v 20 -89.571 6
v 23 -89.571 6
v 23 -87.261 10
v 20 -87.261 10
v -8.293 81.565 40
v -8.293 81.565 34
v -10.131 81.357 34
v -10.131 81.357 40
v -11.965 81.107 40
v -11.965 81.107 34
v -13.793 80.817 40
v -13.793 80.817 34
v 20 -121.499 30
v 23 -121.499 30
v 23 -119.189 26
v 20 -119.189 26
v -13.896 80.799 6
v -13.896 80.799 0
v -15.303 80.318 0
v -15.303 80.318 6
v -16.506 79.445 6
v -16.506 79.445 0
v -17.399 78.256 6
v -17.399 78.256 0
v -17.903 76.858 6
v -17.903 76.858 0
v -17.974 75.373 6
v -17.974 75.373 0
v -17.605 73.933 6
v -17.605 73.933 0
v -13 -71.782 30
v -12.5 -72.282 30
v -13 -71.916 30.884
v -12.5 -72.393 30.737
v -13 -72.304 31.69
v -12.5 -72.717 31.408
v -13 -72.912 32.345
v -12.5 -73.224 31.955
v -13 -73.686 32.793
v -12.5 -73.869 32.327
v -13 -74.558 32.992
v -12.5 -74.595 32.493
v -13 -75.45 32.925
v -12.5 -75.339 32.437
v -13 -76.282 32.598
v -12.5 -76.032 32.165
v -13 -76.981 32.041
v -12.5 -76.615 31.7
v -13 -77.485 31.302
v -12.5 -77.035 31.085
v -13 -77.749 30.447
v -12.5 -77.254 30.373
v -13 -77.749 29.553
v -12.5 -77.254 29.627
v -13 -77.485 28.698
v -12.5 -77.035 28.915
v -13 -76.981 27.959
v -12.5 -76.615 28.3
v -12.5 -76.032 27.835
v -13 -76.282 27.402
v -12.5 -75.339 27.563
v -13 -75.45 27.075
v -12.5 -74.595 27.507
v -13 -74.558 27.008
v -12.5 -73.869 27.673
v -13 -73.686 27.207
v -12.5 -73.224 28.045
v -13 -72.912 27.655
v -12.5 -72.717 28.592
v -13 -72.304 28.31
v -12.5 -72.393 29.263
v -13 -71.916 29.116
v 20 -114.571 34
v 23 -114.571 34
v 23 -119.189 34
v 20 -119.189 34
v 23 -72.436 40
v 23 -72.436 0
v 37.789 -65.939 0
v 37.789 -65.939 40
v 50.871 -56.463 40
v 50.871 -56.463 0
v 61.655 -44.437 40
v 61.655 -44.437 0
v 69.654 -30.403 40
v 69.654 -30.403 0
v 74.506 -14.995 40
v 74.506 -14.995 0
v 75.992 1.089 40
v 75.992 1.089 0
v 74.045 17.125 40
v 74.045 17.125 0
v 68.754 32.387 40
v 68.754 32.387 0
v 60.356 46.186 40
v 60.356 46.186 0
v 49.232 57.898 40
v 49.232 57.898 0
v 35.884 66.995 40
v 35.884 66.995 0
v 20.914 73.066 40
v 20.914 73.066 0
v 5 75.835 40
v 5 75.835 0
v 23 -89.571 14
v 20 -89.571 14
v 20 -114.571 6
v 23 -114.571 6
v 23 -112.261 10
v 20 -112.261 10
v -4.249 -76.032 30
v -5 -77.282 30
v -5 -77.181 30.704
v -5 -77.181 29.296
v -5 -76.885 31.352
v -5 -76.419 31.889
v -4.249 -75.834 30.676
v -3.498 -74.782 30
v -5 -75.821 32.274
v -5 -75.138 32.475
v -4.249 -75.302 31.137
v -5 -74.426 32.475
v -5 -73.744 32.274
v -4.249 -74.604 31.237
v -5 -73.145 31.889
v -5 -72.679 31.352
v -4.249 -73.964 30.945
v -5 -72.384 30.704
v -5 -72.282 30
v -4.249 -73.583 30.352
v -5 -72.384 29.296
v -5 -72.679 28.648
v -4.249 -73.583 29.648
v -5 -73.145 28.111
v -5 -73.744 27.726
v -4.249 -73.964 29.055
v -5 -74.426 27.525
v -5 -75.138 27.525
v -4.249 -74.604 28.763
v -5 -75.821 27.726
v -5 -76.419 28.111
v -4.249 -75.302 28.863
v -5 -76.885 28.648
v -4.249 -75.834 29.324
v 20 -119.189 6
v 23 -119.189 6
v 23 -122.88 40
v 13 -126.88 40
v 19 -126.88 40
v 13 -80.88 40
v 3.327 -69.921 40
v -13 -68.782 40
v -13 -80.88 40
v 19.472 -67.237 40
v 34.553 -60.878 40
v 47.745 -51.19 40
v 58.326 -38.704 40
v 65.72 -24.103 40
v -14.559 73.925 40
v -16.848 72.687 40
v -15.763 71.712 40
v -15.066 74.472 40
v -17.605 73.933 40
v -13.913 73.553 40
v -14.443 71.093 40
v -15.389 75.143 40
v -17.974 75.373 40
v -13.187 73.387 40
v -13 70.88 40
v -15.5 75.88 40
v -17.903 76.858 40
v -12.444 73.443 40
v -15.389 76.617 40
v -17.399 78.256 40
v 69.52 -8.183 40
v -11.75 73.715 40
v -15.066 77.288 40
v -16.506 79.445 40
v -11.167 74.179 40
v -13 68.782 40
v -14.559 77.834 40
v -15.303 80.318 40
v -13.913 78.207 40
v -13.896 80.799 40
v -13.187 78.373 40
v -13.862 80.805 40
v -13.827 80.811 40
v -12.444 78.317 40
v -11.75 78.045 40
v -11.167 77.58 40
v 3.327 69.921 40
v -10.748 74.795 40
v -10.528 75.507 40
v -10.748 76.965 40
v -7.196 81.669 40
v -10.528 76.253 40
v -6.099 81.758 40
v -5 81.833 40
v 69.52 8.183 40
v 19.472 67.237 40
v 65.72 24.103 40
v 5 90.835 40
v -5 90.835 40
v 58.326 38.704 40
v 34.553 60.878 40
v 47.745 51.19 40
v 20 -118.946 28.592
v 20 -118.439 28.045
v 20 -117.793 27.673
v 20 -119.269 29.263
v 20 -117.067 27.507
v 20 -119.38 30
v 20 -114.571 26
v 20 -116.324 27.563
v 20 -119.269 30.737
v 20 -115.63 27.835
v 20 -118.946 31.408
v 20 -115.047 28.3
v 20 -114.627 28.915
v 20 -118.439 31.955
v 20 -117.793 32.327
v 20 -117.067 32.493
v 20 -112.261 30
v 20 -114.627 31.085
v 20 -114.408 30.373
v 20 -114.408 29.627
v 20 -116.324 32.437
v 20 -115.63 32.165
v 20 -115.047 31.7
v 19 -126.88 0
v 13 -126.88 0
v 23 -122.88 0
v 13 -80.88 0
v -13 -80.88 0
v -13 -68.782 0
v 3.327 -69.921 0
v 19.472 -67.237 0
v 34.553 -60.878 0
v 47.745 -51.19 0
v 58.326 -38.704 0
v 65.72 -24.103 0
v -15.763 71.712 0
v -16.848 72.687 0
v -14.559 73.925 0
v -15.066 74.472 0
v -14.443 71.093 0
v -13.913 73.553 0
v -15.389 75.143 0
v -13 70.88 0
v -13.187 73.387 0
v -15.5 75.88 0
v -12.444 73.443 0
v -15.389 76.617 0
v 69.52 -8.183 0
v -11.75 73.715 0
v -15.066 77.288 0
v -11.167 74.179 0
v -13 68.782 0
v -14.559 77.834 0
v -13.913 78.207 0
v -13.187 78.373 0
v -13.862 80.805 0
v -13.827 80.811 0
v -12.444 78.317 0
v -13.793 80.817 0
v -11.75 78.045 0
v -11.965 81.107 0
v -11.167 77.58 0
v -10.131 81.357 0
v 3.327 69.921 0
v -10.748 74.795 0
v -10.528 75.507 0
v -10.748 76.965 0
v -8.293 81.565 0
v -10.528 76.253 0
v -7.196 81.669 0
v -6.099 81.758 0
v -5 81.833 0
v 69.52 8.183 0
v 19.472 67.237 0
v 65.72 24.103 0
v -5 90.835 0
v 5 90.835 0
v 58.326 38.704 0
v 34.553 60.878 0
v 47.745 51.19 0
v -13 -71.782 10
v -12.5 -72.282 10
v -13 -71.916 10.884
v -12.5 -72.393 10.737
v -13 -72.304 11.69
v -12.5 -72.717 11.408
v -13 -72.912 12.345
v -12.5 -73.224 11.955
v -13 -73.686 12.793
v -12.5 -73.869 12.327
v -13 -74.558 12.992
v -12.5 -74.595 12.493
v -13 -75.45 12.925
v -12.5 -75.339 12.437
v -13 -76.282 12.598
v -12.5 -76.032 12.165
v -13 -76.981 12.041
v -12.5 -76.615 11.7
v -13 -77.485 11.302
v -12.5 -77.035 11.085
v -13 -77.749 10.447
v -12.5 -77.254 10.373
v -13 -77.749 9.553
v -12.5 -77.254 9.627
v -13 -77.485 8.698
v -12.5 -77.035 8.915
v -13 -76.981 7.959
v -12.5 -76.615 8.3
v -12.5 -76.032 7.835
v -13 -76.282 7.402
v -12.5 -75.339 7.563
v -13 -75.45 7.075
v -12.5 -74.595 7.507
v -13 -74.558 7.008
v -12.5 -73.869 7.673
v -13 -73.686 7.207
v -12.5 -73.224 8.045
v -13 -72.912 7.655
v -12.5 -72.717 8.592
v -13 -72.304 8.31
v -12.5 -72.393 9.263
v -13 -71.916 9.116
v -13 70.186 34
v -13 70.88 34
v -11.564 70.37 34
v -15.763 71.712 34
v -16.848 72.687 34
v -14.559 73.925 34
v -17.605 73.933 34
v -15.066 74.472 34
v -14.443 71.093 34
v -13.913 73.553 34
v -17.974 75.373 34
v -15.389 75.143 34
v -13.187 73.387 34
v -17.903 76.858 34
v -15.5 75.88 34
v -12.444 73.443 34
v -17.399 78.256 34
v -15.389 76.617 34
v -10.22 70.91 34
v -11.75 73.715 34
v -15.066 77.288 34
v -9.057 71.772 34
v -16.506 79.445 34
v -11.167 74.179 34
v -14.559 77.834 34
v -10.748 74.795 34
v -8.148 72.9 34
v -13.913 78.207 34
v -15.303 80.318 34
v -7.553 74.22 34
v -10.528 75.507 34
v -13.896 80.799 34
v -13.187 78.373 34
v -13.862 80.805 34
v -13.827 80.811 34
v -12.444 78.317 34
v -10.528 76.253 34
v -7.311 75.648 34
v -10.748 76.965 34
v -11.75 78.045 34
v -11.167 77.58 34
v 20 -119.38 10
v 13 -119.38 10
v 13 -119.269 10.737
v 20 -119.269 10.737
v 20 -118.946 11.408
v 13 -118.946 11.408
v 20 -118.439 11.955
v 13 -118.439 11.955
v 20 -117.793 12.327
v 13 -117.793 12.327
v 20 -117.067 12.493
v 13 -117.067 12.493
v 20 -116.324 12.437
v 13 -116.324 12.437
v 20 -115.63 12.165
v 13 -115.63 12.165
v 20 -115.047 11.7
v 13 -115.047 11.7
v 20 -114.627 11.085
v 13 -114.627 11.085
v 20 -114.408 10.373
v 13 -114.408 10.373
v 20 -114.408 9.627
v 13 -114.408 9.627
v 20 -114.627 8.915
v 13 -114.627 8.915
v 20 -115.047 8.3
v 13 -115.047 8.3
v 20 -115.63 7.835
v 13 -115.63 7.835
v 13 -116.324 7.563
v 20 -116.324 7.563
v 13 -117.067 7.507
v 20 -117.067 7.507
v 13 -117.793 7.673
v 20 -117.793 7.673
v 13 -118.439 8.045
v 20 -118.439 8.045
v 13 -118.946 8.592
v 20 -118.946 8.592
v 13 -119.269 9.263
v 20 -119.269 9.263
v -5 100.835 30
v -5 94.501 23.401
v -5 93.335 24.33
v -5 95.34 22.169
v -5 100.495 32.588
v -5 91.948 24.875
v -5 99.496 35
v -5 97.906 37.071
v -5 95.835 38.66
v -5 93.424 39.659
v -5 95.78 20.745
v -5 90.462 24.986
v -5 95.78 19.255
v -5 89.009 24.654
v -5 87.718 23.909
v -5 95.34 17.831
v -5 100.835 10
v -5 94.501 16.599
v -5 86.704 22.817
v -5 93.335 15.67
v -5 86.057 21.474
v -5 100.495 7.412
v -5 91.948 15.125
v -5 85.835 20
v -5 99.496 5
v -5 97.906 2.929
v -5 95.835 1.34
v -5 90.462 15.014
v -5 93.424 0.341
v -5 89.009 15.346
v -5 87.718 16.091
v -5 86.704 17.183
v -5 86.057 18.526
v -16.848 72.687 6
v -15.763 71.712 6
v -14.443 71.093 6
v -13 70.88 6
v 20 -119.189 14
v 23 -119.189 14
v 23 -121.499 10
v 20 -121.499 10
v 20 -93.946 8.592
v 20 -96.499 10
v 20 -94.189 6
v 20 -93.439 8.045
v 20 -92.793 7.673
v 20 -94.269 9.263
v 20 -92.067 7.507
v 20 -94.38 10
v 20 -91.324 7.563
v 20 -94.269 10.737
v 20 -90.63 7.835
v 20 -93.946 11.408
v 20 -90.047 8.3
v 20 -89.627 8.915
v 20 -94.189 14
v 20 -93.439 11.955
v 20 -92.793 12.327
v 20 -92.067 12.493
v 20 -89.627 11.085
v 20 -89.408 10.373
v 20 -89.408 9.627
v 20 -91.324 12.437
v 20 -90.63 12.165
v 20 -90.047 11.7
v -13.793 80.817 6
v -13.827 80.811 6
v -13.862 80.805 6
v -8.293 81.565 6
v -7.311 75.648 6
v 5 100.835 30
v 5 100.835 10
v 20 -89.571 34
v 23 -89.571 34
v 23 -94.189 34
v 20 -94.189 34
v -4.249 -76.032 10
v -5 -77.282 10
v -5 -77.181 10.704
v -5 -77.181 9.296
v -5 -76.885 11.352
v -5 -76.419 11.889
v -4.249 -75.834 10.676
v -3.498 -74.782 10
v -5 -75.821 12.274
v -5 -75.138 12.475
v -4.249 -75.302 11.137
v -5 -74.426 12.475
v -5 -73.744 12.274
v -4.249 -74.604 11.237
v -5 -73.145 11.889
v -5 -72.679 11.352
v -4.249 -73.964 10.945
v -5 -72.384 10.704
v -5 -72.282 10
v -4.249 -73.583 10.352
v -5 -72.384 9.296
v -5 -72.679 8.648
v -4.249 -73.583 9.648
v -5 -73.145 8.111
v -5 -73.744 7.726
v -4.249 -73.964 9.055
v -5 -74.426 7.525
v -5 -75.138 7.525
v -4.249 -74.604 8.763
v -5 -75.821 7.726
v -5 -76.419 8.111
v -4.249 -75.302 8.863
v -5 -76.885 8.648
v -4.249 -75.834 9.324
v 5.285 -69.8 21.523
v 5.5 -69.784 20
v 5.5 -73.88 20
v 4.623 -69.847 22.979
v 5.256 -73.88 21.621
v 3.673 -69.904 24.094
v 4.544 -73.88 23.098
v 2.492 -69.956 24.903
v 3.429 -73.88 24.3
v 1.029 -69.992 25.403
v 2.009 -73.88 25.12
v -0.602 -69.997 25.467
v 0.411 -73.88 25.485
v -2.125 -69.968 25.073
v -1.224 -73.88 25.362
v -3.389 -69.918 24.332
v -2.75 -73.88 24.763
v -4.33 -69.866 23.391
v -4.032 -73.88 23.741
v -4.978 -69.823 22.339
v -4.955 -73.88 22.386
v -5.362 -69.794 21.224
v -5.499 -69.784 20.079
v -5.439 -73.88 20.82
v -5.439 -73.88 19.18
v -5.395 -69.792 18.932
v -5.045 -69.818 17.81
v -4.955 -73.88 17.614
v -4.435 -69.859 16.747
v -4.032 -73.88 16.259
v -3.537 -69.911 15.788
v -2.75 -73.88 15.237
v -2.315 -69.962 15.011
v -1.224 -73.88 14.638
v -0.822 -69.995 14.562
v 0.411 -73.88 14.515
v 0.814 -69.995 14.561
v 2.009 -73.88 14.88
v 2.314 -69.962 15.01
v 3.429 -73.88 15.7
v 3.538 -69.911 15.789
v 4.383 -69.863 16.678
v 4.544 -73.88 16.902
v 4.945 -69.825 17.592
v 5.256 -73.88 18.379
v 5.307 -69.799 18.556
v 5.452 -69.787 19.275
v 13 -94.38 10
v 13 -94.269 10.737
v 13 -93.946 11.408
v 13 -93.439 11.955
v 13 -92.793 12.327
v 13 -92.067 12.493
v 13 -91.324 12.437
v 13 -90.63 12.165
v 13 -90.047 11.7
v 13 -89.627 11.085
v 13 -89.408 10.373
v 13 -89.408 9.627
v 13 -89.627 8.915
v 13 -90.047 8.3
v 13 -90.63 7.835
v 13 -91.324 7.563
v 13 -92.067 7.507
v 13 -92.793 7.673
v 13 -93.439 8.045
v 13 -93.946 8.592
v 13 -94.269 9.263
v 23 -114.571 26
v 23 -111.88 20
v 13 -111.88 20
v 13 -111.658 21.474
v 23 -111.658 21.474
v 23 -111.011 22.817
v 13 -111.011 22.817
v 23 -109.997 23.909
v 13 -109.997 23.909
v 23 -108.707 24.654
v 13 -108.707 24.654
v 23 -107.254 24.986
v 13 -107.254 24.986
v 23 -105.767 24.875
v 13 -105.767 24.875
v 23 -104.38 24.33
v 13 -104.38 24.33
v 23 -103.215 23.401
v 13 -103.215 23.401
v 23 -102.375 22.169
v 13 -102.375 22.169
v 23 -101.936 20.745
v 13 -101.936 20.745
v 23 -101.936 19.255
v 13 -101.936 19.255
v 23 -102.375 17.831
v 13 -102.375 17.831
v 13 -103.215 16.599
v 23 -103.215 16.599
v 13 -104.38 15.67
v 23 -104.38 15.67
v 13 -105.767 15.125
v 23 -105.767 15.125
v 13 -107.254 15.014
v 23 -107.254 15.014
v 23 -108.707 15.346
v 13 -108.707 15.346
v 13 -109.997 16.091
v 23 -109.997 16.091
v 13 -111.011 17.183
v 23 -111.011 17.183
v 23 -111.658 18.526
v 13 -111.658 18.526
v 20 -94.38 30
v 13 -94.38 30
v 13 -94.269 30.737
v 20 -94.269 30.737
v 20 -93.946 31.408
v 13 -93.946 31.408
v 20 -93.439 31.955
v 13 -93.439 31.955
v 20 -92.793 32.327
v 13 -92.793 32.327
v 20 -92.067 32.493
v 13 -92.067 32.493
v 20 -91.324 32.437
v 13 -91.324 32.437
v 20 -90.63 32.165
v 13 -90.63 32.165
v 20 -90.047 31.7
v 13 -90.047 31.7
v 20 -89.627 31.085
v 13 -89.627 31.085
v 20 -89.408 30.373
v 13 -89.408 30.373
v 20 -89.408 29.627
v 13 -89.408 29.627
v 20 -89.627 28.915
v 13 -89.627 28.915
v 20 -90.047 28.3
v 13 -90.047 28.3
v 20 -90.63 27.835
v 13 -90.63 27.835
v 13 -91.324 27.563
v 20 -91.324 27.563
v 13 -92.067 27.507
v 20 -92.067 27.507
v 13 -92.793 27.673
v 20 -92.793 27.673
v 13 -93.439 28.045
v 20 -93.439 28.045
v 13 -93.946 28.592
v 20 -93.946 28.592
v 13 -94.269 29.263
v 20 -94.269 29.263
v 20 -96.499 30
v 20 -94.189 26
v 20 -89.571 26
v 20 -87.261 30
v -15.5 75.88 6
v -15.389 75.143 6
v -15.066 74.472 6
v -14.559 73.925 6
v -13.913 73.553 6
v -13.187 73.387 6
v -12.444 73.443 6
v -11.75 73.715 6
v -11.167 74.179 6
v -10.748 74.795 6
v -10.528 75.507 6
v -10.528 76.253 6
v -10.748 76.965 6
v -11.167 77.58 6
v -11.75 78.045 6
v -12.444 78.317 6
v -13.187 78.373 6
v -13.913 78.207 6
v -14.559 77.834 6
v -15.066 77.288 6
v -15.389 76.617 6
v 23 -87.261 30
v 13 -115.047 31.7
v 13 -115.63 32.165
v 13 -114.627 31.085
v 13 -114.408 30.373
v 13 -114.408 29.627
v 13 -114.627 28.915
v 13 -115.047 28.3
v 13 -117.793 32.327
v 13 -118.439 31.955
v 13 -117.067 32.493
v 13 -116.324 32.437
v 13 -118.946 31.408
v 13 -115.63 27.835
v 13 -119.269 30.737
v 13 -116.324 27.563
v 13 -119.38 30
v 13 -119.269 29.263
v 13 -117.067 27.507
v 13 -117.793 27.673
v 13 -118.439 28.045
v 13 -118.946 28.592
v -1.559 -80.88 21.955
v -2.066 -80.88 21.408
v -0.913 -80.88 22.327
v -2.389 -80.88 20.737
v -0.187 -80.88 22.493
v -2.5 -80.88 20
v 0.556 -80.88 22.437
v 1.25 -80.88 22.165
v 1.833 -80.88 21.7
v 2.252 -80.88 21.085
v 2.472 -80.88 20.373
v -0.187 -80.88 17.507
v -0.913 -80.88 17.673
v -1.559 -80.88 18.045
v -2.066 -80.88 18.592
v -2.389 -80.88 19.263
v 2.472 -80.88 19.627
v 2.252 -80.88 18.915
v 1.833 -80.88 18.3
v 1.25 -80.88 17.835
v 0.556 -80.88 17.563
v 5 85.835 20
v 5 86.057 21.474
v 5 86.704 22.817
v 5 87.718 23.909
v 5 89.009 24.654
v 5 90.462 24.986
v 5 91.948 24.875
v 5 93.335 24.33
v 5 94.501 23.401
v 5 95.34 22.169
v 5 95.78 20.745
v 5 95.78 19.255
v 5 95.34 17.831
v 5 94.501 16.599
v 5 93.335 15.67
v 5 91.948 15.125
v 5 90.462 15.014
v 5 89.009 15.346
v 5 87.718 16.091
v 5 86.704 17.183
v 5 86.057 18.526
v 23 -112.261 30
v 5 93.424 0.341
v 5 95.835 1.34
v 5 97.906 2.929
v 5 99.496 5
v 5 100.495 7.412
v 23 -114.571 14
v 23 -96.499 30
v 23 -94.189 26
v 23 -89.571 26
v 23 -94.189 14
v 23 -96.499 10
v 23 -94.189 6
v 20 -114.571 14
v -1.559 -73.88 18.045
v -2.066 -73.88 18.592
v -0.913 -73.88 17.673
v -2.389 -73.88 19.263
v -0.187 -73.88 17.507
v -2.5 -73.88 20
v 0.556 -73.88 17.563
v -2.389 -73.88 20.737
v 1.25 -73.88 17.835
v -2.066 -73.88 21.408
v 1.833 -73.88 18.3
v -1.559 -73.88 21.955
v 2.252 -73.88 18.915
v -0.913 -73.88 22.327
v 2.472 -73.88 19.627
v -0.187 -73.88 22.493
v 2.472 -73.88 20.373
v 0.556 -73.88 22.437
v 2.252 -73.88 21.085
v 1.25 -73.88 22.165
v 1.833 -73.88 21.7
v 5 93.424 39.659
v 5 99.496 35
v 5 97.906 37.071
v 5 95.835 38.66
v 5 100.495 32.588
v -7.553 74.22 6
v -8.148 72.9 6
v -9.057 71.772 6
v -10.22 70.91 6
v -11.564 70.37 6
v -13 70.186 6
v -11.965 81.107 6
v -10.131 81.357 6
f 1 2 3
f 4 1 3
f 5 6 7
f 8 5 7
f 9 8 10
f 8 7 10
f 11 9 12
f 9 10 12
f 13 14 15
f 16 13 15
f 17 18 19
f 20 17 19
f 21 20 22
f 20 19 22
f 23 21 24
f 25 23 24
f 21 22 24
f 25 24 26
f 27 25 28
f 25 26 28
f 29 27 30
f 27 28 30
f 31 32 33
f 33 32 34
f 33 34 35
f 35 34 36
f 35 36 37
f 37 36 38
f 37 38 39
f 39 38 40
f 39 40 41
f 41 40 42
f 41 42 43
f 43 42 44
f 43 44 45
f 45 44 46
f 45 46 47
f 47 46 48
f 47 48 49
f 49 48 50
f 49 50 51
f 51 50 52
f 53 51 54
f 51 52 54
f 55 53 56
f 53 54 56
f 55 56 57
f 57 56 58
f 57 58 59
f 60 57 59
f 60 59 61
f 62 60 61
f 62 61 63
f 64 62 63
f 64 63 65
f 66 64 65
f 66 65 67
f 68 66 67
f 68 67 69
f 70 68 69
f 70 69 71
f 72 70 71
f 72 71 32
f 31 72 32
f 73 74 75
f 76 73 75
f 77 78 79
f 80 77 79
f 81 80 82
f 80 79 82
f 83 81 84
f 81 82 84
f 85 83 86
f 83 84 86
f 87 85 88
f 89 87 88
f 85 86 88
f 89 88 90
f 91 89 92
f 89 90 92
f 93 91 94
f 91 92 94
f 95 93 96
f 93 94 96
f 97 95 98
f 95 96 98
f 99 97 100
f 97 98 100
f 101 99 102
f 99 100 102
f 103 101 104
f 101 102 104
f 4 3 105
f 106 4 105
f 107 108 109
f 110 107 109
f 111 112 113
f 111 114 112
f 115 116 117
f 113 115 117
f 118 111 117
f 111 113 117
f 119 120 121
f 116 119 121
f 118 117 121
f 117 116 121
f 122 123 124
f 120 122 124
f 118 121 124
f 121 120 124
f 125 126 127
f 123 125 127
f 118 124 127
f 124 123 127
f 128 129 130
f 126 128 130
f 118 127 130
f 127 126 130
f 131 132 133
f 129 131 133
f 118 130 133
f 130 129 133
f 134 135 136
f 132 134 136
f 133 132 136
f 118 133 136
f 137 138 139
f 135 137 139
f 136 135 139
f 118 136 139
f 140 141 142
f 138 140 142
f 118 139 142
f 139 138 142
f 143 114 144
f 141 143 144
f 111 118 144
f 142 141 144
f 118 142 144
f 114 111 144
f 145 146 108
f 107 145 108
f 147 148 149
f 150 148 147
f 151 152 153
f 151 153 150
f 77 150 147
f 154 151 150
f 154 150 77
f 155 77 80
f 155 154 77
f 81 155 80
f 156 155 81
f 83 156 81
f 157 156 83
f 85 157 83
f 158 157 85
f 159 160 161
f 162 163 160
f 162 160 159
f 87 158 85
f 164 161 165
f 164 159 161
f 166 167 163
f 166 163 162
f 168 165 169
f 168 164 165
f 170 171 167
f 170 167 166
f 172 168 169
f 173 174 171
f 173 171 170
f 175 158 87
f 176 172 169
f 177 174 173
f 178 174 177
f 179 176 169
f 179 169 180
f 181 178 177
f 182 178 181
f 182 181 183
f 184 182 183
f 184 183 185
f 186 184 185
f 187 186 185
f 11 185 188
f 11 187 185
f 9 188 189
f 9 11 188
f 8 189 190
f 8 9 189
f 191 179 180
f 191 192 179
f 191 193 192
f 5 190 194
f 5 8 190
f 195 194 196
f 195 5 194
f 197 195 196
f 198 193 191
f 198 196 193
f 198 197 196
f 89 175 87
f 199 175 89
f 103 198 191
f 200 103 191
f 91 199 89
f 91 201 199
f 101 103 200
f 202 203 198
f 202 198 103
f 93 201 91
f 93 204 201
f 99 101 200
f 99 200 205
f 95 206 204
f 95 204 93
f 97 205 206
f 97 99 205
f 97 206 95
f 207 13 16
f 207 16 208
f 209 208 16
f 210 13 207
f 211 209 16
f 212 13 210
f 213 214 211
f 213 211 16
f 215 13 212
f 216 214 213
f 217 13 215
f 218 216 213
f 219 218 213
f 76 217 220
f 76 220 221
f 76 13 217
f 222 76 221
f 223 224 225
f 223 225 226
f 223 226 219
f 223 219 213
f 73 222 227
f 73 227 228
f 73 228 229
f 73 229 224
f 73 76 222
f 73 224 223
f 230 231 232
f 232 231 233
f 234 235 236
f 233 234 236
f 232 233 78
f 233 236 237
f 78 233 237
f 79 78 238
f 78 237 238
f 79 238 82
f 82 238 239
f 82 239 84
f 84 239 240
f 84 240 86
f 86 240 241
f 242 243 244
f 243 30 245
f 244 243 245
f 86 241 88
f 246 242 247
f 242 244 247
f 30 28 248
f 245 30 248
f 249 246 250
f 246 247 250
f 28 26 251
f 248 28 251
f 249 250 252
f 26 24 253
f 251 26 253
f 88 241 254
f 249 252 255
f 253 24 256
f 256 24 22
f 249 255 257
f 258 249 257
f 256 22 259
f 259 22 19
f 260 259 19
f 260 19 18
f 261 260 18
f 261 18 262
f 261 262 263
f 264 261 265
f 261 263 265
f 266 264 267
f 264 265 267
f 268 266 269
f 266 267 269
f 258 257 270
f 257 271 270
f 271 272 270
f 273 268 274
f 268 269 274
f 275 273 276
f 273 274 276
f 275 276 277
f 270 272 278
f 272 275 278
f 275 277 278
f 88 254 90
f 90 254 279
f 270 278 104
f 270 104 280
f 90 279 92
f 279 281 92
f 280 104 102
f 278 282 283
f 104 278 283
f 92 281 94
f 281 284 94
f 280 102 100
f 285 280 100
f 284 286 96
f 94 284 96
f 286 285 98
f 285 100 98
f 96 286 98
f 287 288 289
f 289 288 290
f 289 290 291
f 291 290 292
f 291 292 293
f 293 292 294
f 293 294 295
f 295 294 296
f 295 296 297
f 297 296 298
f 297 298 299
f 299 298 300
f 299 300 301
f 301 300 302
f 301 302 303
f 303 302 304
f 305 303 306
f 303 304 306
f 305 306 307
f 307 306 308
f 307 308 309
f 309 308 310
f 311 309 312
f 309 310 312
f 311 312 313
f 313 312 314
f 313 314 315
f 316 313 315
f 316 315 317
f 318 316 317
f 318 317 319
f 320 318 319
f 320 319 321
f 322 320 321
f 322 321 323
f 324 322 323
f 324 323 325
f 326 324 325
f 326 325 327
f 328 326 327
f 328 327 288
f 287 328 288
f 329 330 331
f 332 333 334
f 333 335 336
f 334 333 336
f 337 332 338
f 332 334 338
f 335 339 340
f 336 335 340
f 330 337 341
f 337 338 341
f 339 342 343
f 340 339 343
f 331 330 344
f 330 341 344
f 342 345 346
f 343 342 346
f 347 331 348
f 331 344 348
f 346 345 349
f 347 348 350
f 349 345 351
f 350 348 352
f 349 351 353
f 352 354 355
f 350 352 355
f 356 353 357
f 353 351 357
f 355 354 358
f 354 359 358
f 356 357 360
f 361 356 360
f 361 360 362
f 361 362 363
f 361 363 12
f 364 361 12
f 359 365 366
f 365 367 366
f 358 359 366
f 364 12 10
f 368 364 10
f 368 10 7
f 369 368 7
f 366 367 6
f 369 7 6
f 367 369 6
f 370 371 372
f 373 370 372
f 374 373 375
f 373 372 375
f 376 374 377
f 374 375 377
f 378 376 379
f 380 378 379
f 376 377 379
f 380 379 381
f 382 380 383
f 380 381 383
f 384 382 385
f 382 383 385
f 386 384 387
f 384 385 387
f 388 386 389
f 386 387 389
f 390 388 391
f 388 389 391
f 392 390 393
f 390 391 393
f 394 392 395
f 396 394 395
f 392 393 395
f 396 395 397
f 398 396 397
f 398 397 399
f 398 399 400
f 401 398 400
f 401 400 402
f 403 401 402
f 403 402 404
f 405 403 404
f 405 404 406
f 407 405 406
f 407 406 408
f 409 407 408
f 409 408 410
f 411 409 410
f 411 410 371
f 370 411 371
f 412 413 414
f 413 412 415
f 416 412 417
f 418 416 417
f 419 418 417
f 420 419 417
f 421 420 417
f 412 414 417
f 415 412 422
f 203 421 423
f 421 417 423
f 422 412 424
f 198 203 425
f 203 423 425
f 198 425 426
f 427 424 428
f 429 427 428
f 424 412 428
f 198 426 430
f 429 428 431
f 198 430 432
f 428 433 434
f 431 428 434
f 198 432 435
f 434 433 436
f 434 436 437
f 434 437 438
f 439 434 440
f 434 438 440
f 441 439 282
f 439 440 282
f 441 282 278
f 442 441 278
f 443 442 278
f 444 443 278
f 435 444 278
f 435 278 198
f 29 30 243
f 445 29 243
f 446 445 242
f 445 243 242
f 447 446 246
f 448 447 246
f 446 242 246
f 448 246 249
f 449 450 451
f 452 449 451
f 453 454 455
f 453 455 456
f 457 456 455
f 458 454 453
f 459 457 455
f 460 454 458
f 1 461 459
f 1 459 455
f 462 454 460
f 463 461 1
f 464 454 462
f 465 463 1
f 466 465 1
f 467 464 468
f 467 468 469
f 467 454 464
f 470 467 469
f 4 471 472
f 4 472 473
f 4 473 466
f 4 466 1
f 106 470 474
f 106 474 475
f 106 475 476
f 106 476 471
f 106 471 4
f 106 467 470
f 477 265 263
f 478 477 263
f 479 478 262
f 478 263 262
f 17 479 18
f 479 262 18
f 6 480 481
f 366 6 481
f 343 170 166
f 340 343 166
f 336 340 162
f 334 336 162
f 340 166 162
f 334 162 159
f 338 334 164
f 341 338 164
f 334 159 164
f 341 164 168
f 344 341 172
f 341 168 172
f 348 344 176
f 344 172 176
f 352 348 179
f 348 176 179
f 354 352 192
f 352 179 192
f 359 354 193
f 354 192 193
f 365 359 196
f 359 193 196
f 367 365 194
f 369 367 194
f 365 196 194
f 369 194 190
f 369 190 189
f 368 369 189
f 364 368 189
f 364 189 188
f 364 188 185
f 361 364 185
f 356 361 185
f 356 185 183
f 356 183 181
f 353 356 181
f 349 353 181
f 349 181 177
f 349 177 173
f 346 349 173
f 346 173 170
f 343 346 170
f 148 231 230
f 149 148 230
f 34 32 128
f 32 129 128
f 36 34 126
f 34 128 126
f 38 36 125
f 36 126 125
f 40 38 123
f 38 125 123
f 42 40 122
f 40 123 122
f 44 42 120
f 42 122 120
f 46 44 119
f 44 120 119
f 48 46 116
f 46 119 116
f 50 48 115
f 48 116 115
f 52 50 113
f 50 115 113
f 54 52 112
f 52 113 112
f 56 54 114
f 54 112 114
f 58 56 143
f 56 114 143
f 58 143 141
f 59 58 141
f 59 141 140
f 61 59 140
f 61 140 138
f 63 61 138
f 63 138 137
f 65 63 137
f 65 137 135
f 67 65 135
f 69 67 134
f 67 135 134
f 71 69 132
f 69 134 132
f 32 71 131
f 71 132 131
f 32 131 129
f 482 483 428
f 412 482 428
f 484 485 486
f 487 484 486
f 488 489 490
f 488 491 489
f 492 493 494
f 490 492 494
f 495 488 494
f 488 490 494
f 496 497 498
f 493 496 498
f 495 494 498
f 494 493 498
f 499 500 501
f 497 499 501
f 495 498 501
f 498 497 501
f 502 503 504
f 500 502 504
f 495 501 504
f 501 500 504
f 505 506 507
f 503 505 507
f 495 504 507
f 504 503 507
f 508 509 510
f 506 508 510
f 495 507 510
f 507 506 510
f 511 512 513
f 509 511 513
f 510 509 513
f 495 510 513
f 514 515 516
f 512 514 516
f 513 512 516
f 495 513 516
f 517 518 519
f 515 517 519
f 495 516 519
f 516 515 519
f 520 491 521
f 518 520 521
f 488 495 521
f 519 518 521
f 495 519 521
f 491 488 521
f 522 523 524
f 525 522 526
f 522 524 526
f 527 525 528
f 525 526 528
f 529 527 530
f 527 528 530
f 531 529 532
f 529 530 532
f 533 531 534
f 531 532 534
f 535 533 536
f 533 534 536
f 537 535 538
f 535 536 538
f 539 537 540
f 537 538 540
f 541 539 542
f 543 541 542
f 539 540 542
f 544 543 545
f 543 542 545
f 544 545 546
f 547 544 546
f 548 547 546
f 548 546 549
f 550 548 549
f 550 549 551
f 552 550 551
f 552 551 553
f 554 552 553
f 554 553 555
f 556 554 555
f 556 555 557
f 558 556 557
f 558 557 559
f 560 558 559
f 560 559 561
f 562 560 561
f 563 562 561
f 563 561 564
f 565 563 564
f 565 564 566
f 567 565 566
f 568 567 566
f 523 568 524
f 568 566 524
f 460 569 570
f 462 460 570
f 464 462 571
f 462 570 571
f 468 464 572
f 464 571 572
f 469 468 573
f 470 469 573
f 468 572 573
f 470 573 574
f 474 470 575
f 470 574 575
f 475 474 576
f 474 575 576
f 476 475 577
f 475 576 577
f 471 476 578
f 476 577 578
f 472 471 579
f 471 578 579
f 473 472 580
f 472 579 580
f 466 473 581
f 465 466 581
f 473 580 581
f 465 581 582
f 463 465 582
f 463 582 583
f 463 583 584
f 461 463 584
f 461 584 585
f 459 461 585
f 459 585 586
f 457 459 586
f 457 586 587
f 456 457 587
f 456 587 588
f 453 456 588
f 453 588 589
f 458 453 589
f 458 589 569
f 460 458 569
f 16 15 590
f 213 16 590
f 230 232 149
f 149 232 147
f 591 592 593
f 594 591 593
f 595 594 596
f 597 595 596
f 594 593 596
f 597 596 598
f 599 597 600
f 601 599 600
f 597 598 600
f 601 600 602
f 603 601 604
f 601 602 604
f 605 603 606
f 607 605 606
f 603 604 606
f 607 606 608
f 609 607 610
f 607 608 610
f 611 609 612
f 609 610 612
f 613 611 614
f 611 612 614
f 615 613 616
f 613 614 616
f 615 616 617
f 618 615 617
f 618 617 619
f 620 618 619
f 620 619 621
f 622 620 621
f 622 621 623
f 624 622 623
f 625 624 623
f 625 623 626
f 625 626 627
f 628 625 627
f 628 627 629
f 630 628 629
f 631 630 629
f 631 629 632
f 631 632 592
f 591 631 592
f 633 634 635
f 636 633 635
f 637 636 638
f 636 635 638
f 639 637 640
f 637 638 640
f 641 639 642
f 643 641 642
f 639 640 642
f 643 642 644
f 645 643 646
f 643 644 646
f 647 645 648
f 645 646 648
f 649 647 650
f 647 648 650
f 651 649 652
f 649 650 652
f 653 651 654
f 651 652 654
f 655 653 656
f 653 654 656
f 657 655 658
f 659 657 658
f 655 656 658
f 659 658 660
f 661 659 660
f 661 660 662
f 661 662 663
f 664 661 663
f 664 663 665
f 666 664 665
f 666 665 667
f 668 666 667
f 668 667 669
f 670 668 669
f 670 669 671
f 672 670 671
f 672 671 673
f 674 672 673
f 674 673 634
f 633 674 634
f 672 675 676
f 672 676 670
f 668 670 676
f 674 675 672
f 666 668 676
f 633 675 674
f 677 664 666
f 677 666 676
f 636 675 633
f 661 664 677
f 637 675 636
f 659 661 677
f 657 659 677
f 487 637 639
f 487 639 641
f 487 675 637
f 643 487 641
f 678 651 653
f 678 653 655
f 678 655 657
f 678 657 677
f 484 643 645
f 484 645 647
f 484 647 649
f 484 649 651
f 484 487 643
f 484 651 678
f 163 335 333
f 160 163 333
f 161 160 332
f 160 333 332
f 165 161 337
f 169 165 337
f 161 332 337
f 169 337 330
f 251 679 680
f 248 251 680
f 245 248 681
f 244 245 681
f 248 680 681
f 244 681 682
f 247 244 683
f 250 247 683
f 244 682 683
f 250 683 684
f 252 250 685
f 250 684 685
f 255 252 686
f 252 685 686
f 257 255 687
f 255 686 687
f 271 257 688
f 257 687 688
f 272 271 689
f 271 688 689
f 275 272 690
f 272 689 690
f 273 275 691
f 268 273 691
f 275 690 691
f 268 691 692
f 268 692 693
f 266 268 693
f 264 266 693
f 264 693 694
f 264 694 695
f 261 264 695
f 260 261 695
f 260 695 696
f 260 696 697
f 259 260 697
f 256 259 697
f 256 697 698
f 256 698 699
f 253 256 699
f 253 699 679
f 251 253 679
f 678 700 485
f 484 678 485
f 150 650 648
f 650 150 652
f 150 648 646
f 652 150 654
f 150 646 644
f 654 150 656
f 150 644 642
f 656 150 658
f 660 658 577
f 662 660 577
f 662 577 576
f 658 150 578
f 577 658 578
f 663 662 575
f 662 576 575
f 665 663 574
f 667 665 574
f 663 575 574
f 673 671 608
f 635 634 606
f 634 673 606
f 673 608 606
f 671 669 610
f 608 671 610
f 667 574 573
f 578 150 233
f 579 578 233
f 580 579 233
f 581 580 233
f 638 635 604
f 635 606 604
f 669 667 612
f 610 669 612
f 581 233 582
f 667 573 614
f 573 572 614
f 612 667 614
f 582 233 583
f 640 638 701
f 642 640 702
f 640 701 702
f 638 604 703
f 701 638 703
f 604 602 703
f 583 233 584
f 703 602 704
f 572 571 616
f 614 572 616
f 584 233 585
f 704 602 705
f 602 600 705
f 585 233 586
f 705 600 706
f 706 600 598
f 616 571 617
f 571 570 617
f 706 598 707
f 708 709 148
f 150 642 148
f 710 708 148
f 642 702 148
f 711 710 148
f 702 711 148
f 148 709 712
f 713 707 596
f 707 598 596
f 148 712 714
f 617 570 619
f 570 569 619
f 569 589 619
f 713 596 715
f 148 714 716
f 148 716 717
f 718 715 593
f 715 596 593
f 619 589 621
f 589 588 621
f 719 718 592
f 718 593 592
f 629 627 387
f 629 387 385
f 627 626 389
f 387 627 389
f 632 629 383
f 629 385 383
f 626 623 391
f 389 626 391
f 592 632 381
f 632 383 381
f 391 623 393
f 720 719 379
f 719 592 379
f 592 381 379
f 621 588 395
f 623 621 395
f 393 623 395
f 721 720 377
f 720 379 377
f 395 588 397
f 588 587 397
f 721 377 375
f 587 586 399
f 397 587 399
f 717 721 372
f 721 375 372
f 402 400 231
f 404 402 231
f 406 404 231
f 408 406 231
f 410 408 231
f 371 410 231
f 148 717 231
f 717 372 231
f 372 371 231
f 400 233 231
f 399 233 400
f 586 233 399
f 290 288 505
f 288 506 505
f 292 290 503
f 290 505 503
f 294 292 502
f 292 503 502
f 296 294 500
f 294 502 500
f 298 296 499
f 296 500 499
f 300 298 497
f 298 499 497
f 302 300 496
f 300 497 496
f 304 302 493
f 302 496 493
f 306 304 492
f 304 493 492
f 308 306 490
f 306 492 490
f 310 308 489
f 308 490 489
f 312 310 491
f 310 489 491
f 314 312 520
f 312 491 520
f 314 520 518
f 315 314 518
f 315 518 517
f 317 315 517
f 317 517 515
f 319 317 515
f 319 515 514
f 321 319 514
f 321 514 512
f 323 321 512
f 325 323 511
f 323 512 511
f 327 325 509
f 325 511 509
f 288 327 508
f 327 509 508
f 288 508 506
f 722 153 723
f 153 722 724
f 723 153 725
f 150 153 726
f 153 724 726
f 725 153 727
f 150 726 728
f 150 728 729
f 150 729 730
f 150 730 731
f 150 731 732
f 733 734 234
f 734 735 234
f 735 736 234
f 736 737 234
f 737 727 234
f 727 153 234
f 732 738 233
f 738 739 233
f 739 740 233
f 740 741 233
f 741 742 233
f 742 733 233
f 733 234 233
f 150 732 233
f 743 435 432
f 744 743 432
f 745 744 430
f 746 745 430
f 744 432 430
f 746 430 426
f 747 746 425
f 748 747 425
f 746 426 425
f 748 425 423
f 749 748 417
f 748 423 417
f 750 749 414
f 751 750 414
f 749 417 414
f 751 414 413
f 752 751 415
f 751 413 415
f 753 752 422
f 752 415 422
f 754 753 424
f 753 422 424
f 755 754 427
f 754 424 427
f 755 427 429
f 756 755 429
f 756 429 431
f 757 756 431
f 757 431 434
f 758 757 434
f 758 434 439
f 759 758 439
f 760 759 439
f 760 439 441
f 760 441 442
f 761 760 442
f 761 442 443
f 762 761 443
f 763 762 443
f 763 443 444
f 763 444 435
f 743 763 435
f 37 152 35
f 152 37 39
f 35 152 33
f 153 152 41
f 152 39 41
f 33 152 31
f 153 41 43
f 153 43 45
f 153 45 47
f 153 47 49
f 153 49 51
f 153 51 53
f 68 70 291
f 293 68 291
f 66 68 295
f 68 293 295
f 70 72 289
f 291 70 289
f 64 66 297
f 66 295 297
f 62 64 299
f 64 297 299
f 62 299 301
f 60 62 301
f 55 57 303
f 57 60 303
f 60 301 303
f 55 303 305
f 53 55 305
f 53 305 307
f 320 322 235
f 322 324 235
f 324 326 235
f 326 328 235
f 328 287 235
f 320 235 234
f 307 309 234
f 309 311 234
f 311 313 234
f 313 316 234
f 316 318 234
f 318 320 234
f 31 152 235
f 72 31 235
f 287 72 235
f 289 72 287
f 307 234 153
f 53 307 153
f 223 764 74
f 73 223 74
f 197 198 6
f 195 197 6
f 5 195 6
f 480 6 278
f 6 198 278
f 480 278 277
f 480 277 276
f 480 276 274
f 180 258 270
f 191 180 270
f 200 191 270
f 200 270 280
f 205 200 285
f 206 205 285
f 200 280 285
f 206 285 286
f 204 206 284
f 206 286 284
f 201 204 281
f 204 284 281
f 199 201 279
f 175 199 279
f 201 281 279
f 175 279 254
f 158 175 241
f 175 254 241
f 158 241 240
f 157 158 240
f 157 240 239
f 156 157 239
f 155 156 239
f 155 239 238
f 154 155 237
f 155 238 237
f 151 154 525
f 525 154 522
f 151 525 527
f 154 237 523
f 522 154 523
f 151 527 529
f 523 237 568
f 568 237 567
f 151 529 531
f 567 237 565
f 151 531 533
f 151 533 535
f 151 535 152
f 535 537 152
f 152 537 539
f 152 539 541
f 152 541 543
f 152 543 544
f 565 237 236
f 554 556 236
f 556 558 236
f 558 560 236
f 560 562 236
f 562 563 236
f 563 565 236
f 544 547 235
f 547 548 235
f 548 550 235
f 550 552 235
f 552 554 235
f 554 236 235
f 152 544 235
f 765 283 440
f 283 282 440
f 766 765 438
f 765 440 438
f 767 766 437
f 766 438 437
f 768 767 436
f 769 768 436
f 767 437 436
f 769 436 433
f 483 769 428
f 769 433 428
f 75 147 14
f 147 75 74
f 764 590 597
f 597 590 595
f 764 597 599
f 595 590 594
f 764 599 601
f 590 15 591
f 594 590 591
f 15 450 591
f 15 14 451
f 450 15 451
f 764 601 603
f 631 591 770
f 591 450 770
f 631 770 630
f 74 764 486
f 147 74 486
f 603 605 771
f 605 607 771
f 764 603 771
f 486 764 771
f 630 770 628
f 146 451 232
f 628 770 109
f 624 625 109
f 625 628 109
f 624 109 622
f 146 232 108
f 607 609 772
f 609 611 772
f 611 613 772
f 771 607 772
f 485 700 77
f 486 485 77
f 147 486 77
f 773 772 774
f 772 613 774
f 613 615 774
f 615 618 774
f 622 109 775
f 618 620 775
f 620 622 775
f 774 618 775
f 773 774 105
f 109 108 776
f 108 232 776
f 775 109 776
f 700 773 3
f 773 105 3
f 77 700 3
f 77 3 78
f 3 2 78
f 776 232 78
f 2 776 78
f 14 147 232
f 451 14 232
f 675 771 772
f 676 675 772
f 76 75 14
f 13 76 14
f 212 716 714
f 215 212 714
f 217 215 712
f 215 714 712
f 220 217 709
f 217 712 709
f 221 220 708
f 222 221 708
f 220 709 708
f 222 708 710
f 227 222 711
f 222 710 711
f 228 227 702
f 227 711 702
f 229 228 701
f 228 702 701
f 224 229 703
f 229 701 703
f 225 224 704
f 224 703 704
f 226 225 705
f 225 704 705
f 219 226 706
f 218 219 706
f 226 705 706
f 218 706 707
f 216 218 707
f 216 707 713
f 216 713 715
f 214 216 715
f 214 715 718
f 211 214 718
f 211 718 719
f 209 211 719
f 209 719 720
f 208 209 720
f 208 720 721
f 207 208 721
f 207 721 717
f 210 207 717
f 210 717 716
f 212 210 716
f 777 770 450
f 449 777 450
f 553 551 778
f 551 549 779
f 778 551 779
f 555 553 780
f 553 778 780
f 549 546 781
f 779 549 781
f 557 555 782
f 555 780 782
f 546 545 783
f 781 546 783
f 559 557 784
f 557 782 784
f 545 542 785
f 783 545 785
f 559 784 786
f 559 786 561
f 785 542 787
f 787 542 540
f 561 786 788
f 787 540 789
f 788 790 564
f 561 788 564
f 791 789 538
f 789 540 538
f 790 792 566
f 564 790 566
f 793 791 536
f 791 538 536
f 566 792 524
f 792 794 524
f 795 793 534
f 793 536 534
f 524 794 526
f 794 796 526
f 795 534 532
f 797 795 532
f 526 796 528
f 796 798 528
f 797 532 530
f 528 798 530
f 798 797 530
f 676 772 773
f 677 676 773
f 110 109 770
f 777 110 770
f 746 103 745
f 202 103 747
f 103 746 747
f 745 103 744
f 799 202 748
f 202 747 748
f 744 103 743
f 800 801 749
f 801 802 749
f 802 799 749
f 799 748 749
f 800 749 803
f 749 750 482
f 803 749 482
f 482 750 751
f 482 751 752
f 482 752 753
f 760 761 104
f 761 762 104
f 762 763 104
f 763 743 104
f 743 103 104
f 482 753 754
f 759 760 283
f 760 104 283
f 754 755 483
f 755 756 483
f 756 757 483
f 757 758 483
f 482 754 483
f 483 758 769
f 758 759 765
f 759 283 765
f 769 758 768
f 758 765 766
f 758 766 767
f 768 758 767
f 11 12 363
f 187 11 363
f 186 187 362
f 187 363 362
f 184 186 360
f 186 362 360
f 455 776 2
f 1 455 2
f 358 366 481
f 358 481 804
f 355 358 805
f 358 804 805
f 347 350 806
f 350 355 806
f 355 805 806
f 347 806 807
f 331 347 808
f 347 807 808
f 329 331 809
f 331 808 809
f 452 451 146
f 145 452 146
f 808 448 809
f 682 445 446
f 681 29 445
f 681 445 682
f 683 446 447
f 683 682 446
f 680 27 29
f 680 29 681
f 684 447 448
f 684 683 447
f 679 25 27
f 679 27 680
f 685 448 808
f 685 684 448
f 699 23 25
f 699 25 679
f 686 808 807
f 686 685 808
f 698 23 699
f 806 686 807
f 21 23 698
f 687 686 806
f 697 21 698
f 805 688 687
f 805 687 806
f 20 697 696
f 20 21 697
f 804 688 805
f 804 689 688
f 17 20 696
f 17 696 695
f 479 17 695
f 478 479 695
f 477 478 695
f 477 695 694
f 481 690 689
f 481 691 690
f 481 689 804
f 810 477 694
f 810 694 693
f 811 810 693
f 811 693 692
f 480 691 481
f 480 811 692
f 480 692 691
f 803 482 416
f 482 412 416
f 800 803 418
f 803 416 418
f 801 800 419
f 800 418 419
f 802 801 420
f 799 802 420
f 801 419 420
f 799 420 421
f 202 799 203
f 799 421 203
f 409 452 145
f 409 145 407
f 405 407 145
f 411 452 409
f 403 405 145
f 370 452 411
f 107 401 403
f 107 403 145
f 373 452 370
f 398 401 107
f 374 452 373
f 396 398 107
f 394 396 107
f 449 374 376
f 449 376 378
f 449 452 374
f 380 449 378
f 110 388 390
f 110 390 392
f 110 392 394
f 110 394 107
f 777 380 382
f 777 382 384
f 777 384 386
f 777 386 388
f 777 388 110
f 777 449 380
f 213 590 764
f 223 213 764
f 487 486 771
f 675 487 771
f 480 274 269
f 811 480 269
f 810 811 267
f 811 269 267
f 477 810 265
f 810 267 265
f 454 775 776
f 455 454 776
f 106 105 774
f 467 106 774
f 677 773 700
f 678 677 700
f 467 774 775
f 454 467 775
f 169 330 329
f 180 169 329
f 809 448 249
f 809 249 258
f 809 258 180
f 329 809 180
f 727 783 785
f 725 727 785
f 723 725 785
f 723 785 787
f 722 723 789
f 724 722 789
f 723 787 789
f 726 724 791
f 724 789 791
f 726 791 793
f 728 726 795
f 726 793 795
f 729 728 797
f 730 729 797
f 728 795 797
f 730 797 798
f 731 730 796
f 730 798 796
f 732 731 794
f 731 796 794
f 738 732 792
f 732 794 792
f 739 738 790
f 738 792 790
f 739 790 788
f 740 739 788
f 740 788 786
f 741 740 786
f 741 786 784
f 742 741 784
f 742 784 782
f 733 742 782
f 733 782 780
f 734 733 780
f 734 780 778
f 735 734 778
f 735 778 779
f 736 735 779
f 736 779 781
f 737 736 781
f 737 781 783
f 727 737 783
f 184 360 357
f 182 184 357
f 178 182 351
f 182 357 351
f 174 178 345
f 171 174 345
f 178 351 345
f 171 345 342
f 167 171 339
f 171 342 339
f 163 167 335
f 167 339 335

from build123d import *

# Parameters (mm, degrees)
F1_DEPTH       = 40
F2_START       = 34
F2_DEPTH       = 6
F3_DEPTH       = 6
F5_D           = 5
F5_DEPTH       = 8
F5_CSINK_D     = 6
F5_CSINK_ANGLE = 90
F5_TIP         = 1.5021515476
F7_D           = 10
F8_D           = 5
F9_SIZE        = 4
F11_D          = 10
F12_R          = 10
F13_D          = 5
F15_D          = 5
F15_DEPTH      = 12
F15_TIP        = 1.5021515476
F16_START      = -7
F14_R          = 5.5
F16_DEPTH      = 5
F17_DEPTH      = 3


with BuildPart() as f1:
    # F0 (on Top) → F1 (new body)
    with BuildSketch(Plane.XY):
        with BuildLine():
            Line((-8.2927711273, 81.5647094006), (-7.3107365454, 75.6475586596))
            ThreePointArc((-7.3107365454, 75.6475586596), (-6.1560843706, 75.7502648525), (-5, 75.8353479586))
            Line((-5, 75.8353479586), (-5, 81.8325844183))
            ThreePointArc((-5, 81.8325844183), (-6.6477349765, 81.7152341505), (-8.2927711273, 81.5647094006))
        make_face()
        with BuildLine():
            Line((-5, 81.8325844183), (-5, 75.8353479586))
            ThreePointArc((-5, 75.8353479586), (0, 76), (5, 75.8353479586))
            Line((5, 75.8353479586), (5, 100.8353479586))
            Line((5, 100.8353479586), (-5, 100.8353479586))
            Line((-5, 100.8353479586), (-5, 81.8325844183))
        make_face()
        with BuildLine():
            ThreePointArc((-13, 68.7822651561), (44.6654228683, 53.8980519128), (70, 0))
            ThreePointArc((70, 0), (44.6654228683, -53.8980519128), (-13, -68.7822651561))
            Line((-13, -68.7822651561), (-13, -74.8799038461))
            ThreePointArc((-13, -74.8799038461), (0, -76), (13, -74.8799038461))
            ThreePointArc((13, -74.8799038461), (18.0414231151, -73.8275494107), (23, -72.4361788059))
            ThreePointArc((23, -72.4361788059), (61.3351449008, -44.8776113446), (76, 0))
            ThreePointArc((76, 0), (55.4797260267, 51.9422756529), (5, 75.8353479586))
            ThreePointArc((5, 75.8353479586), (0, 76), (-5, 75.8353479586))
            ThreePointArc((-5, 75.8353479586), (-6.1560843706, 75.7502648525), (-7.3107365454, 75.6475586596))
            ThreePointArc((-7.3107365454, 75.6475586596), (-9.056731807, 71.7723085764), (-13, 70.1858979679))
            Line((-13, 70.1858979679), (-13, 68.7822651561))
        make_face()
        with BuildLine():
            ThreePointArc((13, -74.8799038461), (0, -76), (-13, -74.8799038461))
            Line((-13, -74.8799038461), (-13, -80.8799038461))
            Line((-13, -80.8799038461), (13, -80.8799038461))
            Line((13, -80.8799038461), (13, -74.8799038461))
        make_face()
        with BuildLine():
            ThreePointArc((23, -72.4361788059), (18.0414231151, -73.8275494107), (13, -74.8799038461))
            Line((13, -74.8799038461), (13, -80.8799038461))
            Line((13, -80.8799038461), (13, -126.8799038461))
            Line((13, -126.8799038461), (23, -126.8799038461))
            Line((23, -126.8799038461), (23, -72.4361788059))
        make_face()
    extrude(amount=F1_DEPTH)

    # F0 (on Top) → F2 (join)
    with BuildSketch(Plane.XY.offset(F2_START)):
        with BuildLine():
            ThreePointArc((-8.009195615, 75.576800578), (-7.6600477823, 75.6129861067), (-7.3107365454, 75.6475586596))
            Line((-7.3107365454, 75.6475586596), (-8.2927711273, 81.5647094006))
            ThreePointArc((-8.2927711273, 81.5647094006), (-11.0489742273, 81.2372577153), (-13.7925136268, 80.8166965449))
            ThreePointArc((-13.7925136268, 80.8166965449), (-9.7567430054, 79.6853320831), (-8, 75.8799038461))
            ThreePointArc((-8, 75.8799038461), (-8.0022994325, 75.7282824834), (-8.009195615, 75.576800578))
        make_face()
        with BuildLine():
            Line((-13, 74.8799038461), (-13, 70.8799038461))
            ThreePointArc((-13, 70.8799038461), (-9.5733045321, 72.2387833907), (-8.009195615, 75.576800578))
            ThreePointArc((-8.009195615, 75.576800578), (-10.5103754149, 75.2697283683), (-13, 74.8799038461))
        make_face()
        with BuildLine():
            ThreePointArc((-17.6052855561, 73.9327662169), (-15.7626356848, 71.7124293023), (-13, 70.8799038461))
            Line((-13, 70.8799038461), (-13, 74.8799038461))
            ThreePointArc((-13, 74.8799038461), (-15.3099687594, 74.441956292), (-17.6052855561, 73.9327662169))
        make_face()
        with BuildLine():
            ThreePointArc((-13.8960239837, 80.7989628029), (-17.3991209977, 78.2564001006), (-17.6052855561, 73.9327662169))
            ThreePointArc((-17.6052855561, 73.9327662169), (-15.3099687594, 74.441956292), (-13, 74.8799038461))
            ThreePointArc((-13, 74.8799038461), (-10.5103754149, 75.2697283683), (-8.009195615, 75.576800578))
            ThreePointArc((-8.009195615, 75.576800578), (-8.0022994325, 75.7282824834), (-8, 75.8799038461))
            ThreePointArc((-8, 75.8799038461), (-9.7567430054, 79.6853320831), (-13.7925136268, 80.8166965449))
            ThreePointArc((-13.7925136268, 80.8166965449), (-13.8442716447, 80.8078462478), (-13.8960239837, 80.7989628029))
        make_face()
        with BuildLine():
            Line((-13, 70.8799038461), (-13, 70.1858979679))
            ThreePointArc((-13, 70.1858979679), (-9.056731807, 71.7723085764), (-7.3107365454, 75.6475586596))
            ThreePointArc((-7.3107365454, 75.6475586596), (-7.6600477823, 75.6129861067), (-8.009195615, 75.576800578))
            ThreePointArc((-8.009195615, 75.576800578), (-9.5733045321, 72.2387833907), (-13, 70.8799038461))
        make_face()
    extrude(amount=F2_DEPTH)

    # F0 (on Top) → F3 (join)
    with BuildSketch(Plane.XY):
        with BuildLine():
            ThreePointArc((-8.009195615, 75.576800578), (-7.6600477823, 75.6129861067), (-7.3107365454, 75.6475586596))
            Line((-7.3107365454, 75.6475586596), (-8.2927711273, 81.5647094006))
            ThreePointArc((-8.2927711273, 81.5647094006), (-11.0489742273, 81.2372577153), (-13.7925136268, 80.8166965449))
            ThreePointArc((-13.7925136268, 80.8166965449), (-9.7567430054, 79.6853320831), (-8, 75.8799038461))
            ThreePointArc((-8, 75.8799038461), (-8.0022994325, 75.7282824834), (-8.009195615, 75.576800578))
        make_face()
        with BuildLine():
            Line((-13, 74.8799038461), (-13, 70.8799038461))
            ThreePointArc((-13, 70.8799038461), (-9.5733045321, 72.2387833907), (-8.009195615, 75.576800578))
            ThreePointArc((-8.009195615, 75.576800578), (-10.5103754149, 75.2697283683), (-13, 74.8799038461))
        make_face()
        with BuildLine():
            ThreePointArc((-17.6052855561, 73.9327662169), (-15.7626356848, 71.7124293023), (-13, 70.8799038461))
            Line((-13, 70.8799038461), (-13, 74.8799038461))
            ThreePointArc((-13, 74.8799038461), (-15.3099687594, 74.441956292), (-17.6052855561, 73.9327662169))
        make_face()
        with BuildLine():
            ThreePointArc((-13.8960239837, 80.7989628029), (-17.3991209977, 78.2564001006), (-17.6052855561, 73.9327662169))
            ThreePointArc((-17.6052855561, 73.9327662169), (-15.3099687594, 74.441956292), (-13, 74.8799038461))
            ThreePointArc((-13, 74.8799038461), (-10.5103754149, 75.2697283683), (-8.009195615, 75.576800578))
            ThreePointArc((-8.009195615, 75.576800578), (-8.0022994325, 75.7282824834), (-8, 75.8799038461))
            ThreePointArc((-8, 75.8799038461), (-9.7567430054, 79.6853320831), (-13.7925136268, 80.8166965449))
            ThreePointArc((-13.7925136268, 80.8166965449), (-13.8442716447, 80.8078462478), (-13.8960239837, 80.7989628029))
        make_face()
        with BuildLine():
            Line((-13, 70.8799038461), (-13, 70.1858979679))
            ThreePointArc((-13, 70.1858979679), (-9.056731807, 71.7723085764), (-7.3107365454, 75.6475586596))
            ThreePointArc((-7.3107365454, 75.6475586596), (-7.6600477823, 75.6129861067), (-8.009195615, 75.576800578))
            ThreePointArc((-8.009195615, 75.576800578), (-9.5733045321, 72.2387833907), (-13, 70.8799038461))
        make_face()
    extrude(amount=F3_DEPTH)

    # F5
    with Locations(Plane(origin=(-13, 0, 0), x_dir=(0, -1, 0), z_dir=(-1, 0, 0))):
        with Locations((74.7822651561, 30), (74.7822651561, 10)):
            CounterSinkHole(F5_D / 2, F5_CSINK_D / 2, depth=F5_DEPTH, counter_sink_angle=F5_CSINK_ANGLE)
            with Locations((0, 0, -(F5_DEPTH + F5_TIP / 2))):  # 118° drill point
                Cone(0, F5_D / 2, F5_TIP, mode=Mode.SUBTRACT)

    # F7 (through all)
    with Locations(Plane.YZ.offset(23)):
        with Locations((-106.8799038461, 20)):
            Hole(F7_D / 2)

    # F8 (through all)
    with Locations(Plane.YZ.offset(23)):
        with Locations((-116.8799038461, 30), (-91.8799038461, 30), (-91.8799038461, 10), (-116.8799038461, 10)):
            Hole(F8_D / 2)

    # F9
    f9_edges = [f1.edges().sort_by_distance(p)[0] for p in [
        (23, -126.879904, 20),
    ]]
    chamfer(f9_edges, length=F9_SIZE)

    # F11 (through all)
    with Locations(Plane.YZ.offset(5)):
        with Locations((90.8353479586, 20)):
            Hole(F11_D / 2)

    # F12
    f12_edges = [f1.edges().sort_by_distance(p)[0] for p in [
        (0, 100.835348, 40),
        (0, 100.835348, 0),
    ]]
    fillet(f12_edges, radius=F12_R)

    # F13 (through all)
    with Locations(Plane(origin=(0, 0, 0), x_dir=(1, 0, 0), z_dir=(0, 0, -1))):
        with Locations((-13, -75.8799038461)):
            Hole(F13_D / 2)

    # F15
    with Locations(Plane.XZ.offset(80.8799038461)):
        with Locations((0, 20)):
            Hole(F15_D / 2, depth=F15_DEPTH)
            with Locations((0, 0, -(F15_DEPTH + F15_TIP / 2))):  # 118° drill point
                Cone(0, F15_D / 2, F15_TIP, mode=Mode.SUBTRACT)

    # F14 (on face) → F16 (cut)
    with BuildSketch(Plane.XZ.offset(80.8799038461).offset(F16_START)):
        with Locations((0, 20)):
            Circle(F14_R)
    extrude(amount=-F16_DEPTH, mode=Mode.SUBTRACT)

    # F6 (on face) → F17 (cut)
    with BuildSketch(Plane.YZ.offset(23)):
        Polygon((-114.5705027693, 34), (-119.1893049229, 34), (-121.4987059996, 30), (-119.1893049229, 26), (-114.5705027693, 26), (-112.2611016926, 30), align=None)
        Polygon((-89.5705027693, 34), (-94.1893049229, 34), (-96.4987059996, 30), (-94.1893049229, 26), (-89.5705027693, 26), (-87.2611016926, 30), align=None)
        Polygon((-87.2611016926, 10), (-89.5705027693, 14), (-94.1893049229, 14), (-96.4987059996, 10), (-94.1893049229, 6), (-89.5705027693, 6), align=None)
        Polygon((-119.1893049229, 14), (-121.4987059996, 10), (-119.1893049229, 6), (-114.5705027693, 6), (-112.2611016926, 10), (-114.5705027693, 14), align=None)
    extrude(amount=-F17_DEPTH, mode=Mode.SUBTRACT)


solid = f1.part
